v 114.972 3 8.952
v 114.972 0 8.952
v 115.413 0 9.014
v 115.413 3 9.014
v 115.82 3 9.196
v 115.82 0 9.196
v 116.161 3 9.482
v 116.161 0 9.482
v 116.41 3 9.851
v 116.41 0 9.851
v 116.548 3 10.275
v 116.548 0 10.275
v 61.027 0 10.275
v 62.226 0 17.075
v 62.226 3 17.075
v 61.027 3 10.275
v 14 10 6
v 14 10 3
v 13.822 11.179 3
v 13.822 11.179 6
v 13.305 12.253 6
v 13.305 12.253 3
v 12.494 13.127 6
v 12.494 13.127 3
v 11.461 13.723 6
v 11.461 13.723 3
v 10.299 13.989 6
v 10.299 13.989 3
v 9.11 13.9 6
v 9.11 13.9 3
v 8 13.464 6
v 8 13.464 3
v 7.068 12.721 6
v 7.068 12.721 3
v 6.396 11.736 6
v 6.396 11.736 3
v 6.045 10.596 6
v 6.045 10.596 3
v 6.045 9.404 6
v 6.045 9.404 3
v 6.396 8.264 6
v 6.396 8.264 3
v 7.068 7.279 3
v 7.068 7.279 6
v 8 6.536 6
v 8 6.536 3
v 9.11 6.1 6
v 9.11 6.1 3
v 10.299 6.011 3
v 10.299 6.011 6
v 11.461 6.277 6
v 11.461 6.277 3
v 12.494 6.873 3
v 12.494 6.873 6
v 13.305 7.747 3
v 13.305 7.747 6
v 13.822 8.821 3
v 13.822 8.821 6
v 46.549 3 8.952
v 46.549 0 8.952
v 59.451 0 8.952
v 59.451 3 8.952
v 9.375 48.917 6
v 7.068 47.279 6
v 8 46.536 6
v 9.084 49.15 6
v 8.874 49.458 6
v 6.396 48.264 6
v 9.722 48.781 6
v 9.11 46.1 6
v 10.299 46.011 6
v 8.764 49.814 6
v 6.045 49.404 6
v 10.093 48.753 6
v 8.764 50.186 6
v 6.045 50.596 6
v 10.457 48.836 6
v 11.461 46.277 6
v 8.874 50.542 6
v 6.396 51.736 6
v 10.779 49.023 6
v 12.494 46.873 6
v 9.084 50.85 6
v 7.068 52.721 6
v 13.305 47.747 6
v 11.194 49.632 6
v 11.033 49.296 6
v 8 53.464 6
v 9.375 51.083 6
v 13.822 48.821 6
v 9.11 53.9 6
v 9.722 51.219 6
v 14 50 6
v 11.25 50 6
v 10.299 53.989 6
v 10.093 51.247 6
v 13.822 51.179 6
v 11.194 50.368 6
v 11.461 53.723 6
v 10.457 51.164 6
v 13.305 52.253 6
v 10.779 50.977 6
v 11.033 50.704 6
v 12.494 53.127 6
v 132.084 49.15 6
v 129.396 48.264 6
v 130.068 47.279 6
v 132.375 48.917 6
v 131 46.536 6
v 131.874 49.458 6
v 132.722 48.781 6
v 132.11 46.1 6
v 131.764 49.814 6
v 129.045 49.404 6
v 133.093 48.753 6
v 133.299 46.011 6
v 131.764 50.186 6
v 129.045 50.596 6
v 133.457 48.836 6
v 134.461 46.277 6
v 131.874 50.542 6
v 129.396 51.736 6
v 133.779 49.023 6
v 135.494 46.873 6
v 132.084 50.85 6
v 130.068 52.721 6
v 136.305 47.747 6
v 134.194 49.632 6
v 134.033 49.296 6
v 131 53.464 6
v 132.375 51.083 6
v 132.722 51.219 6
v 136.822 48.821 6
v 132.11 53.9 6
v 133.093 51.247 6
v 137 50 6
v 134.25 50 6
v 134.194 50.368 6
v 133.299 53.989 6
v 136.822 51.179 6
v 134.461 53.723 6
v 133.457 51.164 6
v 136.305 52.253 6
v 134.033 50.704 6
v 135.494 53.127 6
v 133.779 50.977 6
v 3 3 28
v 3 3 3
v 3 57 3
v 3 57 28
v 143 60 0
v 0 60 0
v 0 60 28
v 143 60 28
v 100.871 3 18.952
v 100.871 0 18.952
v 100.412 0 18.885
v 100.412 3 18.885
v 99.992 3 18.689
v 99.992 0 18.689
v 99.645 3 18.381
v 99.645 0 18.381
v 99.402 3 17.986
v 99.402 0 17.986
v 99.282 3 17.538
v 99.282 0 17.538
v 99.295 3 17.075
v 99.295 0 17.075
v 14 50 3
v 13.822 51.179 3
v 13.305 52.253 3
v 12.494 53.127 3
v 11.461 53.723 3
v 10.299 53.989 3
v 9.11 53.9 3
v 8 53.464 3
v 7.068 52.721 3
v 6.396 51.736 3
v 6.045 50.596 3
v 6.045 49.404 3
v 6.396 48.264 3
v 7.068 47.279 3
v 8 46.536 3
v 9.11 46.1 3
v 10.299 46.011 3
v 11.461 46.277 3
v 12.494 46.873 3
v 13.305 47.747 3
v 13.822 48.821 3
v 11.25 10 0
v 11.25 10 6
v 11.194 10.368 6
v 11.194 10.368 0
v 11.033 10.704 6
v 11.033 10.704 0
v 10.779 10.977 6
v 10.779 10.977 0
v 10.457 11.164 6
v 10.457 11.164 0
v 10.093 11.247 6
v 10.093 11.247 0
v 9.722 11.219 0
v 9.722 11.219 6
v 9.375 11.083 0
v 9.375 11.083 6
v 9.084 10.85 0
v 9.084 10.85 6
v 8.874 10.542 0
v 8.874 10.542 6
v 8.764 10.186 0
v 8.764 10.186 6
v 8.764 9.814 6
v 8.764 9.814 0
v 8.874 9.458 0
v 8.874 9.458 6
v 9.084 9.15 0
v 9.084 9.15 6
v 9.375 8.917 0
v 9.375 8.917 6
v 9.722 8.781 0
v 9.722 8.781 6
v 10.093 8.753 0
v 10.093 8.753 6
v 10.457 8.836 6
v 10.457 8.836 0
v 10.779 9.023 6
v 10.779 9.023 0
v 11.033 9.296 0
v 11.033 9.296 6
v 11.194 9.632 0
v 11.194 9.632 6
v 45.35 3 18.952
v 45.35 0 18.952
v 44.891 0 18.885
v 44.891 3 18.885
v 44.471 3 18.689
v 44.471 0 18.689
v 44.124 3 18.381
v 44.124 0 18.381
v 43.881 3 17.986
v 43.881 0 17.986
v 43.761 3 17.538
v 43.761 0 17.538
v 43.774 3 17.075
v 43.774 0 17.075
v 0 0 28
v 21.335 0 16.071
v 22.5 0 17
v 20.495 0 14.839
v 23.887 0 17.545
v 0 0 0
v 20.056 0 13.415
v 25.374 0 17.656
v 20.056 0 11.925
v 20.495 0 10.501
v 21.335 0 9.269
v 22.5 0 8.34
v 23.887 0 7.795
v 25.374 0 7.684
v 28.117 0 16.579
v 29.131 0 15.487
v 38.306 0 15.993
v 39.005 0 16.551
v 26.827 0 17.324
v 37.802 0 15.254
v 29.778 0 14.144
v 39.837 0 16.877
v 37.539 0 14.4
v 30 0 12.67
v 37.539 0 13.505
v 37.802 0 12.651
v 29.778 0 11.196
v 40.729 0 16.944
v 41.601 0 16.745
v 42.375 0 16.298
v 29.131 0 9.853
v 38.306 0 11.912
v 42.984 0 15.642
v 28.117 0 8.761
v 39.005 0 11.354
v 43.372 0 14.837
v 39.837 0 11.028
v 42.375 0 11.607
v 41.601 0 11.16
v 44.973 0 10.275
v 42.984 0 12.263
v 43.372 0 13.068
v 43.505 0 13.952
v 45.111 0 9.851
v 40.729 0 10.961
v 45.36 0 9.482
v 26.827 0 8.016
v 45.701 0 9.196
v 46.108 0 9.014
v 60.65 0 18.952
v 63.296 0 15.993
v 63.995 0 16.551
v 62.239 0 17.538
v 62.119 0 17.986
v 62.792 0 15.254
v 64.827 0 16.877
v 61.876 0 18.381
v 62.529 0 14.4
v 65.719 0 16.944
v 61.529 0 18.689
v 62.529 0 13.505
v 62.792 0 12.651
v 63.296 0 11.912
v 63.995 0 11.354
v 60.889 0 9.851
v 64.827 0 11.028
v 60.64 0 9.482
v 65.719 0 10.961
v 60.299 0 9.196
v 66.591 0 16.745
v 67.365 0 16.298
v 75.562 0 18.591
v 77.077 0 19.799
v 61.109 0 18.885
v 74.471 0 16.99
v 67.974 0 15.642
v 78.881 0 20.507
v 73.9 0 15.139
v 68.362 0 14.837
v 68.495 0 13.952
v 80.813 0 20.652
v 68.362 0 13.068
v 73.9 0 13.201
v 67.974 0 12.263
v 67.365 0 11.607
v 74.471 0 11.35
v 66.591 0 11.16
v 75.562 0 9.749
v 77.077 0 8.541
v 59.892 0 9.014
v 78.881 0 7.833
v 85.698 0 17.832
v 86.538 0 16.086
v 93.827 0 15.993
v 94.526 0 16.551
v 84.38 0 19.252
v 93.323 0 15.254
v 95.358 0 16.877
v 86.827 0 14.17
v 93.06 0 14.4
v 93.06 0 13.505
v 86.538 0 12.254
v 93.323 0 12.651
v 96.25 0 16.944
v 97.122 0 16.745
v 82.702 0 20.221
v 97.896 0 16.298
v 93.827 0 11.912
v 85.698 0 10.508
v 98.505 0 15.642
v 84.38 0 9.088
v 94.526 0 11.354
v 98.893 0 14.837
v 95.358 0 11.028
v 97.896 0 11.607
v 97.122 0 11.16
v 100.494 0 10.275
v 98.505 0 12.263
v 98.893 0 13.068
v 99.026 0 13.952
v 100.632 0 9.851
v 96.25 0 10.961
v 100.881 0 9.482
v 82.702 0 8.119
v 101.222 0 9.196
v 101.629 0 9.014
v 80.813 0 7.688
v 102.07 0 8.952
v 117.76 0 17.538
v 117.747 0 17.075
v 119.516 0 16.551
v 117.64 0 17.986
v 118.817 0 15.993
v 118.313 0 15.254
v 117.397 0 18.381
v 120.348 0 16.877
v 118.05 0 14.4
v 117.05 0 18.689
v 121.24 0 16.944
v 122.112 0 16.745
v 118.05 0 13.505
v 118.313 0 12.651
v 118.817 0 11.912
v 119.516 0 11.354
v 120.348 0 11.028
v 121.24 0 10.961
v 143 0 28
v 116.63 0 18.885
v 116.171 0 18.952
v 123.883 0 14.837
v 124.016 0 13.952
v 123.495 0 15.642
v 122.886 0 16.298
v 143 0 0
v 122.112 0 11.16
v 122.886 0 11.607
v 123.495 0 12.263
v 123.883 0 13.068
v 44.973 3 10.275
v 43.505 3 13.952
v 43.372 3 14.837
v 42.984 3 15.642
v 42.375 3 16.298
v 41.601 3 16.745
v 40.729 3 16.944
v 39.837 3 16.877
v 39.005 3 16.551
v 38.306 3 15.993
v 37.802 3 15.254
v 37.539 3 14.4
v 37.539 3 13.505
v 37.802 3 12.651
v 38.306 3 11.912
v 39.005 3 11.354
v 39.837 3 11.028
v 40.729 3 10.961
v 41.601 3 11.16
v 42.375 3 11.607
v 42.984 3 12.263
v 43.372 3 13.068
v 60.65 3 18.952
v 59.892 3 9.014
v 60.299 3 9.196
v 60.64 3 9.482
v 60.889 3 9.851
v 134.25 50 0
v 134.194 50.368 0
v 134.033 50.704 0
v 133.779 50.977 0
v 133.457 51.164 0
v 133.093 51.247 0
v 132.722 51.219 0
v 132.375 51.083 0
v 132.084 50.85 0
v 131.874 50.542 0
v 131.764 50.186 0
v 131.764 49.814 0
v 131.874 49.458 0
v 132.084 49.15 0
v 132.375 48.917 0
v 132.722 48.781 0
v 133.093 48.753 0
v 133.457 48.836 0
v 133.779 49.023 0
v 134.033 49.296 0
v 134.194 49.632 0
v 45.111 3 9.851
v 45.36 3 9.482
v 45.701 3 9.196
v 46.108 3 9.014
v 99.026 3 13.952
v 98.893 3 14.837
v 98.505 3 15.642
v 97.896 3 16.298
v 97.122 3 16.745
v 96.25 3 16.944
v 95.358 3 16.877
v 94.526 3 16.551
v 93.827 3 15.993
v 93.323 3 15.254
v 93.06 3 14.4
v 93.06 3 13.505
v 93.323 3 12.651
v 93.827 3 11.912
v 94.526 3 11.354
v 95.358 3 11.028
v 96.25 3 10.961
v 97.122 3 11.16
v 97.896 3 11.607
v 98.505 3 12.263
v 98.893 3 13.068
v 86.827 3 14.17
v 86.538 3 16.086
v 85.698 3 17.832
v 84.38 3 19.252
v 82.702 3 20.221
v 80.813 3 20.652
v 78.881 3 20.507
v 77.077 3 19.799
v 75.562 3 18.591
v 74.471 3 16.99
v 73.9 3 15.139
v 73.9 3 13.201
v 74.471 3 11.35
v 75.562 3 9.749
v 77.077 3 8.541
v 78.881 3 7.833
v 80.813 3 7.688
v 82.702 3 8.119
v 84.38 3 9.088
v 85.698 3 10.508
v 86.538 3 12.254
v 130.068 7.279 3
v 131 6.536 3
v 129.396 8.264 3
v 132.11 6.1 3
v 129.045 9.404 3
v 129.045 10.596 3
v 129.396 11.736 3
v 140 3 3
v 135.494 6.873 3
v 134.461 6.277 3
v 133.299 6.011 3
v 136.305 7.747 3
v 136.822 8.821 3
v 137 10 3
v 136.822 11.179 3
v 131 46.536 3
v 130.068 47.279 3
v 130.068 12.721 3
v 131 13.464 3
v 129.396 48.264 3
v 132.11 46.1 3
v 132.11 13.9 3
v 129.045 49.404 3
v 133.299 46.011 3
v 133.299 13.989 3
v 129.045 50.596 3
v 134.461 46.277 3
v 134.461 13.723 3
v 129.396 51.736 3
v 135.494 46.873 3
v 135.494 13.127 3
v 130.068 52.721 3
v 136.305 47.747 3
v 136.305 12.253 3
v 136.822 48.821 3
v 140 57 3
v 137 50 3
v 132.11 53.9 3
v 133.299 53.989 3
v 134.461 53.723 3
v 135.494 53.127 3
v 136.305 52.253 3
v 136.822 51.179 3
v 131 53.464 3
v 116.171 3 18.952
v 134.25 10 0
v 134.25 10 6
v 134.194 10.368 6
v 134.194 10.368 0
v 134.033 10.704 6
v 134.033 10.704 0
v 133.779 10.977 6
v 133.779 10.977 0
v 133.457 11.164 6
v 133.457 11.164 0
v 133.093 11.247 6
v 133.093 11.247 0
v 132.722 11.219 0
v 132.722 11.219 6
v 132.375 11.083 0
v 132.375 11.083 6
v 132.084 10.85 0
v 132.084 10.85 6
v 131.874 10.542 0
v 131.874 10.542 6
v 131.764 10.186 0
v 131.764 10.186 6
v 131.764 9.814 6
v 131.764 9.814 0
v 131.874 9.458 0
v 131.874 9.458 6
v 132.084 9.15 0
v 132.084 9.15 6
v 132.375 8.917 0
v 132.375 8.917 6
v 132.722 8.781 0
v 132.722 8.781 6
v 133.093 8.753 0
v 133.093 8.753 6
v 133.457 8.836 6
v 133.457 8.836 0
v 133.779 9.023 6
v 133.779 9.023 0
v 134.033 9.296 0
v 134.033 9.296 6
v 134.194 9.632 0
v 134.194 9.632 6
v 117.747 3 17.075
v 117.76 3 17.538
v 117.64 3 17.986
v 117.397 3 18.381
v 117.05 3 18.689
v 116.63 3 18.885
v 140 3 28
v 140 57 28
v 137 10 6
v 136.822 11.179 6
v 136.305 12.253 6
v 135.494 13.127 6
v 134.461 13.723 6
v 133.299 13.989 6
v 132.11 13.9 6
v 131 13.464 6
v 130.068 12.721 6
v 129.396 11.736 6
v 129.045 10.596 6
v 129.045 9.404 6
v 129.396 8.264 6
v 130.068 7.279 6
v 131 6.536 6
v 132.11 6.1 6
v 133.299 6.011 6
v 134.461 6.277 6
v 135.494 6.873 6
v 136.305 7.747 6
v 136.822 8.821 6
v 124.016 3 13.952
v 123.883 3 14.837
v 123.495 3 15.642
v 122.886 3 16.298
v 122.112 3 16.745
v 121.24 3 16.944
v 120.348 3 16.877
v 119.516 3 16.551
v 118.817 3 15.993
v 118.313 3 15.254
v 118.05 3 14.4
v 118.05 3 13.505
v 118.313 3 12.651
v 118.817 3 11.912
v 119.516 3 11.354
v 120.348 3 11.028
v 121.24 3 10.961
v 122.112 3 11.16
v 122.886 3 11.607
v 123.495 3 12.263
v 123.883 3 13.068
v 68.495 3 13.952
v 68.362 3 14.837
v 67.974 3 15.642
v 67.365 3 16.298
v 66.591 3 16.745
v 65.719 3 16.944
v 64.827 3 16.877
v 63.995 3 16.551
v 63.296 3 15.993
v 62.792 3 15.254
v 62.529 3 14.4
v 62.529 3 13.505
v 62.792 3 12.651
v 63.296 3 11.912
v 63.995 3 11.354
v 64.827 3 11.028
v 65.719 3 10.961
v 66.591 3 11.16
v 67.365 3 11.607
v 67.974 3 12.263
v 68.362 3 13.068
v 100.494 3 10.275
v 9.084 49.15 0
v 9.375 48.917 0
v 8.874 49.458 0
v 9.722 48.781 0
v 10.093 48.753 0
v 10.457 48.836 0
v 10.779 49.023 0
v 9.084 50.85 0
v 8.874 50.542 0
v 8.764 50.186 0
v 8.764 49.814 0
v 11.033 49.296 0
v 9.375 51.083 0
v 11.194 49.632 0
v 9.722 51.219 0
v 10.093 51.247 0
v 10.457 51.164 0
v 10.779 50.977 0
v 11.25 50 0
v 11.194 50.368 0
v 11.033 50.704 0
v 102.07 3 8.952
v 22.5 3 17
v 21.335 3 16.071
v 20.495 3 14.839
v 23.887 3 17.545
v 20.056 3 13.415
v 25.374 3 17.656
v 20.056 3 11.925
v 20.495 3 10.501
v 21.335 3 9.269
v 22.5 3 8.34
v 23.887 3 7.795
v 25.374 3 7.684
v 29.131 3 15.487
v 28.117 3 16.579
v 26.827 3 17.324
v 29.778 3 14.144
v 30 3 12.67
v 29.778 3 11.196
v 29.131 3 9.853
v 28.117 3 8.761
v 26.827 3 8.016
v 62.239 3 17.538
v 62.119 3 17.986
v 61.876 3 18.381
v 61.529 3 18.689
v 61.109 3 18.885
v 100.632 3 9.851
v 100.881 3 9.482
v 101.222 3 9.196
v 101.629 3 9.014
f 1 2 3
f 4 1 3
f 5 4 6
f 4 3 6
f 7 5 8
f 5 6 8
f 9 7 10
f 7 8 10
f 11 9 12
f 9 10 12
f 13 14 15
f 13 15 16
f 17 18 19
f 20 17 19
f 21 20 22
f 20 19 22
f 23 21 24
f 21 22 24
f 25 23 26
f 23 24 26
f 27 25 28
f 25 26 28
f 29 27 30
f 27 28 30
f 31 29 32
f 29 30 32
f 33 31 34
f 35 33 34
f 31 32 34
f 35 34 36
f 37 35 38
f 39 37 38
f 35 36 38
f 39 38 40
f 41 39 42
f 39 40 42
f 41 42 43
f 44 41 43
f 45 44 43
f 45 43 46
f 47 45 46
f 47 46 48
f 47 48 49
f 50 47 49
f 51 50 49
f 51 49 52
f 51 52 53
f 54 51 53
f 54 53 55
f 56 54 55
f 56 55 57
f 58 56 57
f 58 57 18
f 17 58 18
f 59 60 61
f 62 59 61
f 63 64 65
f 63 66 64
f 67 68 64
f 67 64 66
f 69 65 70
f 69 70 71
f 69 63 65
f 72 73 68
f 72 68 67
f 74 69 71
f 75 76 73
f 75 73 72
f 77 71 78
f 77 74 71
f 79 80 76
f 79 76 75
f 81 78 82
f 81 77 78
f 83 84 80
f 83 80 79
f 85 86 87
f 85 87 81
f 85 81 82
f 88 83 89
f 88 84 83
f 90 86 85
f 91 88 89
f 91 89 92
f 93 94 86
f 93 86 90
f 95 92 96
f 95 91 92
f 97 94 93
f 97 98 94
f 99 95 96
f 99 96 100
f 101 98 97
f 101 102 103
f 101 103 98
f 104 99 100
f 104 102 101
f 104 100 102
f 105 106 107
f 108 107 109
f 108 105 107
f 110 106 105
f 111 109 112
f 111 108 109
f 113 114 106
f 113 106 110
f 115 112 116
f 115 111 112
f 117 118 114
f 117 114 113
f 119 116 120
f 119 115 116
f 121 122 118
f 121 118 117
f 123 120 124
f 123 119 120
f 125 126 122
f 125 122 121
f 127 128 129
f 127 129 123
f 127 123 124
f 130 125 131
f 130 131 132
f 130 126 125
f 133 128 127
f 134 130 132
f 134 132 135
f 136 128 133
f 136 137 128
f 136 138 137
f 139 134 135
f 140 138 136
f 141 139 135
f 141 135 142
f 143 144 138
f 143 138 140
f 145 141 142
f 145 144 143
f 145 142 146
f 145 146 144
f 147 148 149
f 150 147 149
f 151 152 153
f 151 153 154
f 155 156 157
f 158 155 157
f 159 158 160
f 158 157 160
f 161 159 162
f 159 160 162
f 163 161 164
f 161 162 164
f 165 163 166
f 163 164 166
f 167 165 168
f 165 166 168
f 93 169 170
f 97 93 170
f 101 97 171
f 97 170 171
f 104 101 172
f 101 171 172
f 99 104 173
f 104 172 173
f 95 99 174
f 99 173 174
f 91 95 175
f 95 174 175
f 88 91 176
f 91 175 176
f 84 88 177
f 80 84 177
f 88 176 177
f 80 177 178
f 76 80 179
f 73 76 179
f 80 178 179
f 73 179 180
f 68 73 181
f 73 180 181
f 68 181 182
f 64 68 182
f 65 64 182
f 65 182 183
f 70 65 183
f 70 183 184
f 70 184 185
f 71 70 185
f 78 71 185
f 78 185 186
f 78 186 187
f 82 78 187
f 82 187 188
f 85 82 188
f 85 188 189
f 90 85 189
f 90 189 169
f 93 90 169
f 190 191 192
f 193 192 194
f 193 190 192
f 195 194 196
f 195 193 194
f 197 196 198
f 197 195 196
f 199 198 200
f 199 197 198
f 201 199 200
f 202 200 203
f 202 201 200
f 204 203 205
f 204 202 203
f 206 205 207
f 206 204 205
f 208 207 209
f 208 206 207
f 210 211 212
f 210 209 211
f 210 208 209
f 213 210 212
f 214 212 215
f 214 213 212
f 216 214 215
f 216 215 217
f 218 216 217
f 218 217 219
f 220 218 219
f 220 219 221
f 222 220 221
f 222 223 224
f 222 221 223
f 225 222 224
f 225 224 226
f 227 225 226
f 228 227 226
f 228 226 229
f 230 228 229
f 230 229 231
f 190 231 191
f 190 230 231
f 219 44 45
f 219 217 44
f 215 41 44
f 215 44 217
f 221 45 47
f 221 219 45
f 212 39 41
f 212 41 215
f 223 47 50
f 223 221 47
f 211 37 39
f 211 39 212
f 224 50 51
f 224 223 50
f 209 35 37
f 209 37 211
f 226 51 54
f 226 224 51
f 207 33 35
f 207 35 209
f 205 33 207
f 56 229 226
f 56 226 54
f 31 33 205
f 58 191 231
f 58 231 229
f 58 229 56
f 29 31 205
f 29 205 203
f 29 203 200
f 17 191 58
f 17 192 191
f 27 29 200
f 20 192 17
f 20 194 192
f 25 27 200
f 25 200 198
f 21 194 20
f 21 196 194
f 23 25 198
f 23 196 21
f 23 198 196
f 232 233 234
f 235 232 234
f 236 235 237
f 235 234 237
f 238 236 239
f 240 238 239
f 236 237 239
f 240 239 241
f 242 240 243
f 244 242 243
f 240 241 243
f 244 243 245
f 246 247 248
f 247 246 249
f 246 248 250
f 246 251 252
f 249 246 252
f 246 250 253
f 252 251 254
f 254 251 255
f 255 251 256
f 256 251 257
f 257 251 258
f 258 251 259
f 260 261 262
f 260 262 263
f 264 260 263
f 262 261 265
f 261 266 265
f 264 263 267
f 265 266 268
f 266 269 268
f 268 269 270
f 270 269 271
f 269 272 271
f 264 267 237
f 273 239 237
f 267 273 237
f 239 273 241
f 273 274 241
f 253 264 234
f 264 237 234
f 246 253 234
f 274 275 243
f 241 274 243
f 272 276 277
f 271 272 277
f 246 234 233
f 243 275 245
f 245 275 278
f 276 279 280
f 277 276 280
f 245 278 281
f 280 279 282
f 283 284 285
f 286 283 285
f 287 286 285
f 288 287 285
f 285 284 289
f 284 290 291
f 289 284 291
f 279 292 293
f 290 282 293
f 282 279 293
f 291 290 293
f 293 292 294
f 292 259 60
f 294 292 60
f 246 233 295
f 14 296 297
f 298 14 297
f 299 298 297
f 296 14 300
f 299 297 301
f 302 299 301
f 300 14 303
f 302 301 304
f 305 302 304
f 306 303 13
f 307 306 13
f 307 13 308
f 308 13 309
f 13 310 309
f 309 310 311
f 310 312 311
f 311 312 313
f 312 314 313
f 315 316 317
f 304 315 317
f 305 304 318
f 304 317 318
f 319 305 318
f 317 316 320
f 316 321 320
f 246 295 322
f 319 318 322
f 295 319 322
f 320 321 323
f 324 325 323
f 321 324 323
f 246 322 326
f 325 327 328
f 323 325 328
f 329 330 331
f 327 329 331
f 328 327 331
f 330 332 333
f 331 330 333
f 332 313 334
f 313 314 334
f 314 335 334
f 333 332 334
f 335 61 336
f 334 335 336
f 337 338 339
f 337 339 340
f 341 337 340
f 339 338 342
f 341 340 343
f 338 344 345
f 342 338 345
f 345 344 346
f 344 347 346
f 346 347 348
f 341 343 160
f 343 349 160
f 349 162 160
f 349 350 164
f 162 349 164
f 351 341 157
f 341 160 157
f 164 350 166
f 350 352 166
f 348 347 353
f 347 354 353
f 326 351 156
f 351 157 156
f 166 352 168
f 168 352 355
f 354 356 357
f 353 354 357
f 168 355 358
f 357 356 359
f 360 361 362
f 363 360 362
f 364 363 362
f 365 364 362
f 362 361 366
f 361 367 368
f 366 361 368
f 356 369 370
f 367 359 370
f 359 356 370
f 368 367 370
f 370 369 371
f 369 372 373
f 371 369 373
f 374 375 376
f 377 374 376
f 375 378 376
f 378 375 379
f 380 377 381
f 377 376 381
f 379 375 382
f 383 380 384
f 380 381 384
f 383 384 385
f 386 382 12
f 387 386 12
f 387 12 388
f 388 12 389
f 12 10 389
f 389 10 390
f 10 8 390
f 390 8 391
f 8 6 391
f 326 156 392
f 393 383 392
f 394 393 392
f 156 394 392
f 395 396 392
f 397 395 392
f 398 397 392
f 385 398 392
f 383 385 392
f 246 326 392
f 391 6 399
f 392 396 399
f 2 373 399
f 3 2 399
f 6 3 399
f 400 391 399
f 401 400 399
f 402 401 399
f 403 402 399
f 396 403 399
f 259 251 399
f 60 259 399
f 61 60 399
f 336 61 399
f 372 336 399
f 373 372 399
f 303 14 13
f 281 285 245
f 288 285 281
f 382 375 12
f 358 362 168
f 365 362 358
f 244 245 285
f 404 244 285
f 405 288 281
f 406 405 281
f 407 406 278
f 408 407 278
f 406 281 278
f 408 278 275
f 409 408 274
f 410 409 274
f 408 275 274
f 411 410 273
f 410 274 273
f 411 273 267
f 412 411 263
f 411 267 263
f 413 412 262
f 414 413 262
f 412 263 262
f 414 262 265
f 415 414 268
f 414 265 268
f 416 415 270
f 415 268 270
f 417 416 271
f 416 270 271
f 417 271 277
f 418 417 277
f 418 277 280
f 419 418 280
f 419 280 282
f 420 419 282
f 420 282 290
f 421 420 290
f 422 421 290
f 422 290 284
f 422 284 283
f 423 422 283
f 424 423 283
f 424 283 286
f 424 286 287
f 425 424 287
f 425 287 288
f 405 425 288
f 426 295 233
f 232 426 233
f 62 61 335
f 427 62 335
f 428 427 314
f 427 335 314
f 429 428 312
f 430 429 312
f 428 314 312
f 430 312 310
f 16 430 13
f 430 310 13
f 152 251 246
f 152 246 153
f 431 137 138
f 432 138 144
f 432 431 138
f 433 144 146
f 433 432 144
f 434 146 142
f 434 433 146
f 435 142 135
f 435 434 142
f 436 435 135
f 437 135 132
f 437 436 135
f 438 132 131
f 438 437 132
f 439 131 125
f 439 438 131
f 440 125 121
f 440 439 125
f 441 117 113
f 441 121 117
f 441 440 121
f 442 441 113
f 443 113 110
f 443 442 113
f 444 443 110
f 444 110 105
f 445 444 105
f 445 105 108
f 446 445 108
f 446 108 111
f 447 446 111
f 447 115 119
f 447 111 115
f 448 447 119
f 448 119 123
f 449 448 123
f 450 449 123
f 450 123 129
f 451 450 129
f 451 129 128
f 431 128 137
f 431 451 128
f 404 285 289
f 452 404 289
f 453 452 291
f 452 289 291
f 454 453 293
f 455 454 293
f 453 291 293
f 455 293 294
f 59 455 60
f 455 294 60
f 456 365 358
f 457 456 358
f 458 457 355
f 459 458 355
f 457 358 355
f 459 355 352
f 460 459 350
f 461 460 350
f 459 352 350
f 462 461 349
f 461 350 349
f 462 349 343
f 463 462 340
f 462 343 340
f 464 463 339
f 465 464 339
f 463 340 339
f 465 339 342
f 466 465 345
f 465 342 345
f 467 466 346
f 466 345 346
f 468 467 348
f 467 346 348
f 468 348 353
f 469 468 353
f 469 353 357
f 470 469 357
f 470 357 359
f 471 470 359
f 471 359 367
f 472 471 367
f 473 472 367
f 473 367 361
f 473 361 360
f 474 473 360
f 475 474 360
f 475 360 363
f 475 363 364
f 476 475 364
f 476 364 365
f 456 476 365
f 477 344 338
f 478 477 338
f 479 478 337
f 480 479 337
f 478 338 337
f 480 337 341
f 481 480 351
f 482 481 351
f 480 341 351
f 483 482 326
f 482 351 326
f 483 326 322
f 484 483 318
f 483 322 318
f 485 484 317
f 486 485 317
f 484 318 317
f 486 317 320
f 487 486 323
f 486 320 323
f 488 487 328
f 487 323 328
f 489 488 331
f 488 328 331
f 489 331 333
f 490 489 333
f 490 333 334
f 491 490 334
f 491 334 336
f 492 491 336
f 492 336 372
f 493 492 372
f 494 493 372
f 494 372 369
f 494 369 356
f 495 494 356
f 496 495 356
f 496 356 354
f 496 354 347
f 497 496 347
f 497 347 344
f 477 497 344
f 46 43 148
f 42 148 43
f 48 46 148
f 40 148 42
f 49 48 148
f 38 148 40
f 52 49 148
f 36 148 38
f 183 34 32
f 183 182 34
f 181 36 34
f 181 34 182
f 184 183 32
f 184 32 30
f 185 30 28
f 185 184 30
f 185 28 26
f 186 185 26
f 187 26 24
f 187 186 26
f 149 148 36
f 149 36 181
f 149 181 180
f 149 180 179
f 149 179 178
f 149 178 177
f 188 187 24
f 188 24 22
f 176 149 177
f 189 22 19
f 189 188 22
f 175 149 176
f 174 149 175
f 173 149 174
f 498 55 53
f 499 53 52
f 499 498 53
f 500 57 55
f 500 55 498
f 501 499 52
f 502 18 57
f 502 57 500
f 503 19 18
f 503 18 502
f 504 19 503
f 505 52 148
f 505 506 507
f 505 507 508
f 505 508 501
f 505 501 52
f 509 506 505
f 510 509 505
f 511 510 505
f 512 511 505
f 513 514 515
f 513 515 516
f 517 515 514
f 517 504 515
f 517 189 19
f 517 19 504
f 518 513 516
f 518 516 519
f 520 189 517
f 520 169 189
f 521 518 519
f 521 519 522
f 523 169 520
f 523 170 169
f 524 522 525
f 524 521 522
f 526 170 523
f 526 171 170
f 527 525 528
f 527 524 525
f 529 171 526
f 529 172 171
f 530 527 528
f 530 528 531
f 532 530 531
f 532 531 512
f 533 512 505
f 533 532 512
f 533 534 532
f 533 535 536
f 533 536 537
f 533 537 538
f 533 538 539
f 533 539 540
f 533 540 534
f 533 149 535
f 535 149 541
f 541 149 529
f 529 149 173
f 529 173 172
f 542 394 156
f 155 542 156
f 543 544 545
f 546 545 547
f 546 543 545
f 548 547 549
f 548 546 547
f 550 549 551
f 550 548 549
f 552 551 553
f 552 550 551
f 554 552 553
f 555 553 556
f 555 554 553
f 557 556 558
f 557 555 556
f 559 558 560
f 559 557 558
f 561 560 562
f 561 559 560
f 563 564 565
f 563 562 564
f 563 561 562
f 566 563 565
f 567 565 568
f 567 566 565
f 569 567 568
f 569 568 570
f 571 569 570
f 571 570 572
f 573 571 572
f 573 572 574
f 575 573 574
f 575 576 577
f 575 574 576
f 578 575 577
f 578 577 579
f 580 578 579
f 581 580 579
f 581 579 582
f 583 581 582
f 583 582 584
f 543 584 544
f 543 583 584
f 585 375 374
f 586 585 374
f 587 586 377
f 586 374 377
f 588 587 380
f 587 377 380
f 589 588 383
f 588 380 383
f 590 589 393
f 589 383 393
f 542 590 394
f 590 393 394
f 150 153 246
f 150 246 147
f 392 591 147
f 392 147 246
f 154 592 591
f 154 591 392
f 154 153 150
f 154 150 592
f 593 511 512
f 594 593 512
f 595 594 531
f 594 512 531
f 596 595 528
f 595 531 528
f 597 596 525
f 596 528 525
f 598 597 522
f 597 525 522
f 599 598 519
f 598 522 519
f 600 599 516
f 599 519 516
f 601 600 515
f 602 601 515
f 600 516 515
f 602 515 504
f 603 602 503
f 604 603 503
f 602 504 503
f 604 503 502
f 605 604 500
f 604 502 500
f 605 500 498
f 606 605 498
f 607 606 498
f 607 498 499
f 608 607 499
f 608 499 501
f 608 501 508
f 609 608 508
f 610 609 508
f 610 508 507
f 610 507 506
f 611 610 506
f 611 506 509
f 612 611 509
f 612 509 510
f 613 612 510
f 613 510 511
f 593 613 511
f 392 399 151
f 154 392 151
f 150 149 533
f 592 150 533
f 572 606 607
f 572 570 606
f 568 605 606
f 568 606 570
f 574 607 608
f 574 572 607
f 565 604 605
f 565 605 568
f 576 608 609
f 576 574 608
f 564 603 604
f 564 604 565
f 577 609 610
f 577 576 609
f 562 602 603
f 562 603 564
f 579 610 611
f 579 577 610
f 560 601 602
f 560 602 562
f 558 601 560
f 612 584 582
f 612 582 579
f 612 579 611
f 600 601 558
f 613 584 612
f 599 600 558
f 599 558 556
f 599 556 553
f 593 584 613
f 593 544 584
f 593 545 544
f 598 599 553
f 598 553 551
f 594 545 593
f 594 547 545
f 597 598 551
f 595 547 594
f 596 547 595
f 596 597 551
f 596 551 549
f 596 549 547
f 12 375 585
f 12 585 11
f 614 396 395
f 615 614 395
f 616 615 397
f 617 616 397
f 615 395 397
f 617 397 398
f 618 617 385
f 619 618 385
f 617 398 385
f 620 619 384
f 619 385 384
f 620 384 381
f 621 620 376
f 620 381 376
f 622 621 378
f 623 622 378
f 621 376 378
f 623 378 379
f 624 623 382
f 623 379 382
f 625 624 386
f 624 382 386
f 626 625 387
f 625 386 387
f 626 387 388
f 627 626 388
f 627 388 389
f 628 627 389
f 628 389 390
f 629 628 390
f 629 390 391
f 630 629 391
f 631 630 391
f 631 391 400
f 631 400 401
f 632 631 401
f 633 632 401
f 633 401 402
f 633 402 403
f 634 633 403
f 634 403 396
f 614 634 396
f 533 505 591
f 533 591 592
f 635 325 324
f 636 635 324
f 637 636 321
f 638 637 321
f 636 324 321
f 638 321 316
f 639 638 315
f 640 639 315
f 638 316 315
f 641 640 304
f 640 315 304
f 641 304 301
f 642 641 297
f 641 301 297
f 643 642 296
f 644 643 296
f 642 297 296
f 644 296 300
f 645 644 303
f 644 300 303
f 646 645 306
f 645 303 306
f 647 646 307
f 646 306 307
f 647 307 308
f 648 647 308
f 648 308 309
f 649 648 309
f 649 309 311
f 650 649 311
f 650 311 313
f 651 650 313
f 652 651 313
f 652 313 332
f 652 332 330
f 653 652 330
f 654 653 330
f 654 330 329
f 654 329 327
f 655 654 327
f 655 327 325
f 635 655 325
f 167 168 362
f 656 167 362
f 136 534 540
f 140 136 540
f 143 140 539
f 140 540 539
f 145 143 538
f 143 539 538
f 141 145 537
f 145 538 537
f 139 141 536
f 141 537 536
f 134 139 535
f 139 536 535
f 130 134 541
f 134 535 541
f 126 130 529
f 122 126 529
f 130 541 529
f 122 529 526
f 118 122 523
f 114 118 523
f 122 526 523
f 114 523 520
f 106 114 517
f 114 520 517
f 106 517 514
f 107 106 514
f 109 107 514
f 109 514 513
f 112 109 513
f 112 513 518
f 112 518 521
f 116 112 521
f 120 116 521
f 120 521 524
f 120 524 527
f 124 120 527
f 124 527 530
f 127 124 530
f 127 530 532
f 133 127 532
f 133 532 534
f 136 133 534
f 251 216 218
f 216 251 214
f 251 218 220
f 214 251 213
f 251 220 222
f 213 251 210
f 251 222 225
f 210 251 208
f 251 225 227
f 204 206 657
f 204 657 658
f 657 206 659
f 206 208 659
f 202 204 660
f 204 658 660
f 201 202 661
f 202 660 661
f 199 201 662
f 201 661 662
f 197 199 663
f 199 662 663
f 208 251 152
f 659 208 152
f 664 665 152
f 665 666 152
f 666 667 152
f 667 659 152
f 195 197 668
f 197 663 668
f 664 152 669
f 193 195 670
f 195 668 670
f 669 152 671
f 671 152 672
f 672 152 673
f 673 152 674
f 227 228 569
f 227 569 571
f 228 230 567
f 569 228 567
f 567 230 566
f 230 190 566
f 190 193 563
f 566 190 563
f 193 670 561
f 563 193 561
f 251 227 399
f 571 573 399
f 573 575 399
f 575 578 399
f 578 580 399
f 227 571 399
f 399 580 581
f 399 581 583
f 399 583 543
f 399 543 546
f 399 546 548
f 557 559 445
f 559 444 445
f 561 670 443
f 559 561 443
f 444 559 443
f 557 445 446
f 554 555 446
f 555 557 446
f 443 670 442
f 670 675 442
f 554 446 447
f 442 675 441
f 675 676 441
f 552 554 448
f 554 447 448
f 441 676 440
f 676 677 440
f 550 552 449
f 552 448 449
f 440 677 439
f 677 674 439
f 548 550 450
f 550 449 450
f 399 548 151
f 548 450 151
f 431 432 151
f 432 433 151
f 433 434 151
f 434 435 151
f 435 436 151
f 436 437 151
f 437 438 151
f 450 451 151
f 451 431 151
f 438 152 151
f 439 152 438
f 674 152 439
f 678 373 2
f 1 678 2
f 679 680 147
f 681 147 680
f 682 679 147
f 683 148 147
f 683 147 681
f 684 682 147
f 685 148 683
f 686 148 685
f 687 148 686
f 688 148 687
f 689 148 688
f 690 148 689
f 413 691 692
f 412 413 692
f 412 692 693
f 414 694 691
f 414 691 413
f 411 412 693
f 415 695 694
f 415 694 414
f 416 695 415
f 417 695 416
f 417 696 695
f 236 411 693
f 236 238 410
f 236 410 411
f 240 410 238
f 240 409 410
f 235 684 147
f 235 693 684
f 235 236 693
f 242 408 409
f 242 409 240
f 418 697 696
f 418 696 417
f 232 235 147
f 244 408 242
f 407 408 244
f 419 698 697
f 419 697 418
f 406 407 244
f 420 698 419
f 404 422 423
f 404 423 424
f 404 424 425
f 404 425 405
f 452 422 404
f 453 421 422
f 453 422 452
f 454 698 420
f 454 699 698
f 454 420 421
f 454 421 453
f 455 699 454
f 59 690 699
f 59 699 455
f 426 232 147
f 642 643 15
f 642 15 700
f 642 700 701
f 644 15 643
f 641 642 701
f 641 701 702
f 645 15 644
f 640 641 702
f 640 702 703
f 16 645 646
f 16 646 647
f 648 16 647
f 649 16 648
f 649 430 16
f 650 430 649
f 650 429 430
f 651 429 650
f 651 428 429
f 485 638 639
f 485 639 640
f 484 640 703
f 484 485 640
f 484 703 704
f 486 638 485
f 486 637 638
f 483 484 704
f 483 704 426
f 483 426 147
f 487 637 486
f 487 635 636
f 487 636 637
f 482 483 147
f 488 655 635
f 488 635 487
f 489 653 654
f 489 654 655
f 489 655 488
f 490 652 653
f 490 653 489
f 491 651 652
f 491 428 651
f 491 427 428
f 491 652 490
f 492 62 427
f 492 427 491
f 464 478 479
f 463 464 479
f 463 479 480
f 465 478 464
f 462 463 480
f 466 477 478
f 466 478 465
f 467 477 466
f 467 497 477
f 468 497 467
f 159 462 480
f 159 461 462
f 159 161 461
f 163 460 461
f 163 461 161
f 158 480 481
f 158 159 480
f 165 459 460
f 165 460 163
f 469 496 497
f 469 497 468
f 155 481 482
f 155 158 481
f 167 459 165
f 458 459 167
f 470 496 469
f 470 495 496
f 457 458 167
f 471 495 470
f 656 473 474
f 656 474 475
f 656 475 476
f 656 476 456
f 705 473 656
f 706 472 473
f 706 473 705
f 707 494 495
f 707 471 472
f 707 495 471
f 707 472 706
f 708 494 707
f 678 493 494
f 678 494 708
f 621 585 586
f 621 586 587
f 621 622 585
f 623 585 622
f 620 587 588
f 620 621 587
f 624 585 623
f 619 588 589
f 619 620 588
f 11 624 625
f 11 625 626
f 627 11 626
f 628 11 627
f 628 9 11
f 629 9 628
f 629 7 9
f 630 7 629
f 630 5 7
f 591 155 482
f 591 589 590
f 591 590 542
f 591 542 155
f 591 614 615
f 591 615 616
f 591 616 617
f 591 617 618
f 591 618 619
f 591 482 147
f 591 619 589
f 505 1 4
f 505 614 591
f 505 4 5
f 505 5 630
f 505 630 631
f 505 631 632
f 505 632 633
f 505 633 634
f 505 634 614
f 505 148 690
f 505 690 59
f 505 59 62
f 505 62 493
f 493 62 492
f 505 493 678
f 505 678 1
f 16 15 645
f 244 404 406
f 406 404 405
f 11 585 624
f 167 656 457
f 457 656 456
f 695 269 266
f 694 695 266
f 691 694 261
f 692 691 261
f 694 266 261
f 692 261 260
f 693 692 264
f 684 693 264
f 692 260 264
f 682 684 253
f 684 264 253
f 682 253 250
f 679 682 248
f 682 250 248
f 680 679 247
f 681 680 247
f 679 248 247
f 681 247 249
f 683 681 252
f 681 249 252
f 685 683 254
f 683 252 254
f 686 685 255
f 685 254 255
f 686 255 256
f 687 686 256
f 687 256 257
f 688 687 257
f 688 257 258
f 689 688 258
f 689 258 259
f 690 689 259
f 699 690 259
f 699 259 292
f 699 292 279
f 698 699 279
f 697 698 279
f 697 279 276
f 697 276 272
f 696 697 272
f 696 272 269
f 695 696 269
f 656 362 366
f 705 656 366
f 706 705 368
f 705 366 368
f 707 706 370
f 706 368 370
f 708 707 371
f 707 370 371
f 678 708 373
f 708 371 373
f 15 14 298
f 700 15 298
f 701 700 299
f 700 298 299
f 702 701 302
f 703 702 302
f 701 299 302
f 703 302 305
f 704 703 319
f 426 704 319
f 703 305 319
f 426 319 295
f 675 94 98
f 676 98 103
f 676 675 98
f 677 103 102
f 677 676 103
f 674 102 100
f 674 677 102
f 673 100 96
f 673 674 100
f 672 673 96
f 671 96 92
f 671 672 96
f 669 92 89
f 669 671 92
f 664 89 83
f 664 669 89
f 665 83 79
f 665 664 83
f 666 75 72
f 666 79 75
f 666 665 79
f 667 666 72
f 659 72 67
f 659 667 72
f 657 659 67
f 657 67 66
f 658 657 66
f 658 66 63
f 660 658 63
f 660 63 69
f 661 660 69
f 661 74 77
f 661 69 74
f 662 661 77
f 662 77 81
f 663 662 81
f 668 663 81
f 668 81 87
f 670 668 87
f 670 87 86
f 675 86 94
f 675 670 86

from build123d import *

# Parameters (mm, degrees)
SKETCH_W        = 143
SKETCH_H        = 60
PAD_DEPTH       = 28
SKETCH002_W     = 137
SKETCH002_H     = 54
POCKET_DEPTH    = 25.001
SKETCH001_R     = 4
PAD001_DEPTH    = 6
SKETCH003_R     = 1.25
POCKET001_DEPTH = 28.001
SKETCH004_R     = 3.25
SKETCH004_R_2   = 3
SKETCH004_R_3   = 4.75
POCKET002_DEPTH = 5
SKETCH005_R     = 5
SKETCH005_R_2   = 6.5
POCKET003_DEPTH = 5


with BuildPart() as part:
    # Sketch → Pad (new body)
    with BuildSketch(Plane.XY):
        with Locations((71.5, 30)):
            Rectangle(SKETCH_W, SKETCH_H)
    extrude(amount=PAD_DEPTH)

    # Sketch002 → Pocket (cut, through all)
    with BuildSketch(Plane.XY.offset(3)):
        with Locations((71.5, 30)):
            Rectangle(SKETCH002_W, SKETCH002_H)
    extrude(amount=POCKET_DEPTH, mode=Mode.SUBTRACT)

    # Sketch001 → Pad001 (join)
    with BuildSketch(Plane.XY):
        with Locations((10, 50)):
            Circle(SKETCH001_R)
        with Locations((10, 10)):
            Circle(SKETCH001_R)
        with Locations((133, 50)):
            Circle(SKETCH001_R)
        with Locations((133, 10)):
            Circle(SKETCH001_R)
    extrude(amount=PAD001_DEPTH)

    # Sketch003 → Pocket001 (cut, through all)
    with BuildSketch(Plane.XY):
        with Locations((10, 10)):
            Circle(SKETCH003_R)
        with Locations((133, 10)):
            Circle(SKETCH003_R)
        with Locations((133, 50)):
            Circle(SKETCH003_R)
        with Locations((10, 50)):
            Circle(SKETCH003_R)
    extrude(amount=POCKET001_DEPTH, mode=Mode.SUBTRACT)

    # Sketch004 → Pocket002 (cut)
    with BuildSketch(Plane.XZ):
        with Locations((25, 12.67)):
            Circle(SKETCH004_R)
        with Locations((40.505, 13.9525)):
            Circle(SKETCH004_R_2)
        with Locations((65.495, 13.9525)):
            Circle(SKETCH004_R_2)
        with Locations((80.327, 14.17)):
            Circle(SKETCH004_R_3)
        with Locations((96.026, 13.9525)):
            Circle(SKETCH004_R_2)
        with Locations((121.016, 13.9525)):
            Circle(SKETCH004_R_2)
        with BuildLine():
            Line((46.549023, 8.9525), (59.450977, 8.9525))
            ThreePointArc((59.450977, 8.9525), (60.479437, 9.326829), (61.026669, 10.274663))
            Line((62.225692, 17.074663), (61.026669, 10.274663))
            ThreePointArc((62.225692, 17.074663), (61.875671, 18.38096), (60.65, 18.9525))
            Line((60.65, 18.9525), (45.35, 18.9525))
            ThreePointArc((45.35, 18.9525), (44.124329, 18.38096), (43.774308, 17.074663))
            Line((43.774308, 17.074663), (44.973331, 10.274663))
            ThreePointArc((44.973331, 10.274663), (45.520563, 9.326829), (46.549023, 8.9525))
        make_face()
        with BuildLine():
            Line((102.070023, 8.9525), (114.971977, 8.9525))
            ThreePointArc((114.971977, 8.9525), (116.000437, 9.326829), (116.547669, 10.274663))
            Line((117.746692, 17.074663), (116.547669, 10.274663))
            ThreePointArc((117.746692, 17.074663), (117.396671, 18.38096), (116.171, 18.9525))
            Line((116.171, 18.9525), (100.871, 18.9525))
            ThreePointArc((100.871, 18.9525), (99.645329, 18.38096), (99.295308, 17.074663))
            Line((99.295308, 17.074663), (100.494331, 10.274663))
            ThreePointArc((100.494331, 10.274663), (101.041563, 9.326829), (102.070023, 8.9525))
        make_face()
    extrude(amount=-POCKET002_DEPTH, mode=Mode.SUBTRACT)

    # Sketch005 → Pocket003 (cut)
    with BuildSketch(Plane.XZ):
        with Locations((25, 12.67)):
            Circle(SKETCH005_R)
        with Locations((80.327, 14.17)):
            Circle(SKETCH005_R_2)
    extrude(amount=-POCKET003_DEPTH, mode=Mode.SUBTRACT)


solid = part.part
